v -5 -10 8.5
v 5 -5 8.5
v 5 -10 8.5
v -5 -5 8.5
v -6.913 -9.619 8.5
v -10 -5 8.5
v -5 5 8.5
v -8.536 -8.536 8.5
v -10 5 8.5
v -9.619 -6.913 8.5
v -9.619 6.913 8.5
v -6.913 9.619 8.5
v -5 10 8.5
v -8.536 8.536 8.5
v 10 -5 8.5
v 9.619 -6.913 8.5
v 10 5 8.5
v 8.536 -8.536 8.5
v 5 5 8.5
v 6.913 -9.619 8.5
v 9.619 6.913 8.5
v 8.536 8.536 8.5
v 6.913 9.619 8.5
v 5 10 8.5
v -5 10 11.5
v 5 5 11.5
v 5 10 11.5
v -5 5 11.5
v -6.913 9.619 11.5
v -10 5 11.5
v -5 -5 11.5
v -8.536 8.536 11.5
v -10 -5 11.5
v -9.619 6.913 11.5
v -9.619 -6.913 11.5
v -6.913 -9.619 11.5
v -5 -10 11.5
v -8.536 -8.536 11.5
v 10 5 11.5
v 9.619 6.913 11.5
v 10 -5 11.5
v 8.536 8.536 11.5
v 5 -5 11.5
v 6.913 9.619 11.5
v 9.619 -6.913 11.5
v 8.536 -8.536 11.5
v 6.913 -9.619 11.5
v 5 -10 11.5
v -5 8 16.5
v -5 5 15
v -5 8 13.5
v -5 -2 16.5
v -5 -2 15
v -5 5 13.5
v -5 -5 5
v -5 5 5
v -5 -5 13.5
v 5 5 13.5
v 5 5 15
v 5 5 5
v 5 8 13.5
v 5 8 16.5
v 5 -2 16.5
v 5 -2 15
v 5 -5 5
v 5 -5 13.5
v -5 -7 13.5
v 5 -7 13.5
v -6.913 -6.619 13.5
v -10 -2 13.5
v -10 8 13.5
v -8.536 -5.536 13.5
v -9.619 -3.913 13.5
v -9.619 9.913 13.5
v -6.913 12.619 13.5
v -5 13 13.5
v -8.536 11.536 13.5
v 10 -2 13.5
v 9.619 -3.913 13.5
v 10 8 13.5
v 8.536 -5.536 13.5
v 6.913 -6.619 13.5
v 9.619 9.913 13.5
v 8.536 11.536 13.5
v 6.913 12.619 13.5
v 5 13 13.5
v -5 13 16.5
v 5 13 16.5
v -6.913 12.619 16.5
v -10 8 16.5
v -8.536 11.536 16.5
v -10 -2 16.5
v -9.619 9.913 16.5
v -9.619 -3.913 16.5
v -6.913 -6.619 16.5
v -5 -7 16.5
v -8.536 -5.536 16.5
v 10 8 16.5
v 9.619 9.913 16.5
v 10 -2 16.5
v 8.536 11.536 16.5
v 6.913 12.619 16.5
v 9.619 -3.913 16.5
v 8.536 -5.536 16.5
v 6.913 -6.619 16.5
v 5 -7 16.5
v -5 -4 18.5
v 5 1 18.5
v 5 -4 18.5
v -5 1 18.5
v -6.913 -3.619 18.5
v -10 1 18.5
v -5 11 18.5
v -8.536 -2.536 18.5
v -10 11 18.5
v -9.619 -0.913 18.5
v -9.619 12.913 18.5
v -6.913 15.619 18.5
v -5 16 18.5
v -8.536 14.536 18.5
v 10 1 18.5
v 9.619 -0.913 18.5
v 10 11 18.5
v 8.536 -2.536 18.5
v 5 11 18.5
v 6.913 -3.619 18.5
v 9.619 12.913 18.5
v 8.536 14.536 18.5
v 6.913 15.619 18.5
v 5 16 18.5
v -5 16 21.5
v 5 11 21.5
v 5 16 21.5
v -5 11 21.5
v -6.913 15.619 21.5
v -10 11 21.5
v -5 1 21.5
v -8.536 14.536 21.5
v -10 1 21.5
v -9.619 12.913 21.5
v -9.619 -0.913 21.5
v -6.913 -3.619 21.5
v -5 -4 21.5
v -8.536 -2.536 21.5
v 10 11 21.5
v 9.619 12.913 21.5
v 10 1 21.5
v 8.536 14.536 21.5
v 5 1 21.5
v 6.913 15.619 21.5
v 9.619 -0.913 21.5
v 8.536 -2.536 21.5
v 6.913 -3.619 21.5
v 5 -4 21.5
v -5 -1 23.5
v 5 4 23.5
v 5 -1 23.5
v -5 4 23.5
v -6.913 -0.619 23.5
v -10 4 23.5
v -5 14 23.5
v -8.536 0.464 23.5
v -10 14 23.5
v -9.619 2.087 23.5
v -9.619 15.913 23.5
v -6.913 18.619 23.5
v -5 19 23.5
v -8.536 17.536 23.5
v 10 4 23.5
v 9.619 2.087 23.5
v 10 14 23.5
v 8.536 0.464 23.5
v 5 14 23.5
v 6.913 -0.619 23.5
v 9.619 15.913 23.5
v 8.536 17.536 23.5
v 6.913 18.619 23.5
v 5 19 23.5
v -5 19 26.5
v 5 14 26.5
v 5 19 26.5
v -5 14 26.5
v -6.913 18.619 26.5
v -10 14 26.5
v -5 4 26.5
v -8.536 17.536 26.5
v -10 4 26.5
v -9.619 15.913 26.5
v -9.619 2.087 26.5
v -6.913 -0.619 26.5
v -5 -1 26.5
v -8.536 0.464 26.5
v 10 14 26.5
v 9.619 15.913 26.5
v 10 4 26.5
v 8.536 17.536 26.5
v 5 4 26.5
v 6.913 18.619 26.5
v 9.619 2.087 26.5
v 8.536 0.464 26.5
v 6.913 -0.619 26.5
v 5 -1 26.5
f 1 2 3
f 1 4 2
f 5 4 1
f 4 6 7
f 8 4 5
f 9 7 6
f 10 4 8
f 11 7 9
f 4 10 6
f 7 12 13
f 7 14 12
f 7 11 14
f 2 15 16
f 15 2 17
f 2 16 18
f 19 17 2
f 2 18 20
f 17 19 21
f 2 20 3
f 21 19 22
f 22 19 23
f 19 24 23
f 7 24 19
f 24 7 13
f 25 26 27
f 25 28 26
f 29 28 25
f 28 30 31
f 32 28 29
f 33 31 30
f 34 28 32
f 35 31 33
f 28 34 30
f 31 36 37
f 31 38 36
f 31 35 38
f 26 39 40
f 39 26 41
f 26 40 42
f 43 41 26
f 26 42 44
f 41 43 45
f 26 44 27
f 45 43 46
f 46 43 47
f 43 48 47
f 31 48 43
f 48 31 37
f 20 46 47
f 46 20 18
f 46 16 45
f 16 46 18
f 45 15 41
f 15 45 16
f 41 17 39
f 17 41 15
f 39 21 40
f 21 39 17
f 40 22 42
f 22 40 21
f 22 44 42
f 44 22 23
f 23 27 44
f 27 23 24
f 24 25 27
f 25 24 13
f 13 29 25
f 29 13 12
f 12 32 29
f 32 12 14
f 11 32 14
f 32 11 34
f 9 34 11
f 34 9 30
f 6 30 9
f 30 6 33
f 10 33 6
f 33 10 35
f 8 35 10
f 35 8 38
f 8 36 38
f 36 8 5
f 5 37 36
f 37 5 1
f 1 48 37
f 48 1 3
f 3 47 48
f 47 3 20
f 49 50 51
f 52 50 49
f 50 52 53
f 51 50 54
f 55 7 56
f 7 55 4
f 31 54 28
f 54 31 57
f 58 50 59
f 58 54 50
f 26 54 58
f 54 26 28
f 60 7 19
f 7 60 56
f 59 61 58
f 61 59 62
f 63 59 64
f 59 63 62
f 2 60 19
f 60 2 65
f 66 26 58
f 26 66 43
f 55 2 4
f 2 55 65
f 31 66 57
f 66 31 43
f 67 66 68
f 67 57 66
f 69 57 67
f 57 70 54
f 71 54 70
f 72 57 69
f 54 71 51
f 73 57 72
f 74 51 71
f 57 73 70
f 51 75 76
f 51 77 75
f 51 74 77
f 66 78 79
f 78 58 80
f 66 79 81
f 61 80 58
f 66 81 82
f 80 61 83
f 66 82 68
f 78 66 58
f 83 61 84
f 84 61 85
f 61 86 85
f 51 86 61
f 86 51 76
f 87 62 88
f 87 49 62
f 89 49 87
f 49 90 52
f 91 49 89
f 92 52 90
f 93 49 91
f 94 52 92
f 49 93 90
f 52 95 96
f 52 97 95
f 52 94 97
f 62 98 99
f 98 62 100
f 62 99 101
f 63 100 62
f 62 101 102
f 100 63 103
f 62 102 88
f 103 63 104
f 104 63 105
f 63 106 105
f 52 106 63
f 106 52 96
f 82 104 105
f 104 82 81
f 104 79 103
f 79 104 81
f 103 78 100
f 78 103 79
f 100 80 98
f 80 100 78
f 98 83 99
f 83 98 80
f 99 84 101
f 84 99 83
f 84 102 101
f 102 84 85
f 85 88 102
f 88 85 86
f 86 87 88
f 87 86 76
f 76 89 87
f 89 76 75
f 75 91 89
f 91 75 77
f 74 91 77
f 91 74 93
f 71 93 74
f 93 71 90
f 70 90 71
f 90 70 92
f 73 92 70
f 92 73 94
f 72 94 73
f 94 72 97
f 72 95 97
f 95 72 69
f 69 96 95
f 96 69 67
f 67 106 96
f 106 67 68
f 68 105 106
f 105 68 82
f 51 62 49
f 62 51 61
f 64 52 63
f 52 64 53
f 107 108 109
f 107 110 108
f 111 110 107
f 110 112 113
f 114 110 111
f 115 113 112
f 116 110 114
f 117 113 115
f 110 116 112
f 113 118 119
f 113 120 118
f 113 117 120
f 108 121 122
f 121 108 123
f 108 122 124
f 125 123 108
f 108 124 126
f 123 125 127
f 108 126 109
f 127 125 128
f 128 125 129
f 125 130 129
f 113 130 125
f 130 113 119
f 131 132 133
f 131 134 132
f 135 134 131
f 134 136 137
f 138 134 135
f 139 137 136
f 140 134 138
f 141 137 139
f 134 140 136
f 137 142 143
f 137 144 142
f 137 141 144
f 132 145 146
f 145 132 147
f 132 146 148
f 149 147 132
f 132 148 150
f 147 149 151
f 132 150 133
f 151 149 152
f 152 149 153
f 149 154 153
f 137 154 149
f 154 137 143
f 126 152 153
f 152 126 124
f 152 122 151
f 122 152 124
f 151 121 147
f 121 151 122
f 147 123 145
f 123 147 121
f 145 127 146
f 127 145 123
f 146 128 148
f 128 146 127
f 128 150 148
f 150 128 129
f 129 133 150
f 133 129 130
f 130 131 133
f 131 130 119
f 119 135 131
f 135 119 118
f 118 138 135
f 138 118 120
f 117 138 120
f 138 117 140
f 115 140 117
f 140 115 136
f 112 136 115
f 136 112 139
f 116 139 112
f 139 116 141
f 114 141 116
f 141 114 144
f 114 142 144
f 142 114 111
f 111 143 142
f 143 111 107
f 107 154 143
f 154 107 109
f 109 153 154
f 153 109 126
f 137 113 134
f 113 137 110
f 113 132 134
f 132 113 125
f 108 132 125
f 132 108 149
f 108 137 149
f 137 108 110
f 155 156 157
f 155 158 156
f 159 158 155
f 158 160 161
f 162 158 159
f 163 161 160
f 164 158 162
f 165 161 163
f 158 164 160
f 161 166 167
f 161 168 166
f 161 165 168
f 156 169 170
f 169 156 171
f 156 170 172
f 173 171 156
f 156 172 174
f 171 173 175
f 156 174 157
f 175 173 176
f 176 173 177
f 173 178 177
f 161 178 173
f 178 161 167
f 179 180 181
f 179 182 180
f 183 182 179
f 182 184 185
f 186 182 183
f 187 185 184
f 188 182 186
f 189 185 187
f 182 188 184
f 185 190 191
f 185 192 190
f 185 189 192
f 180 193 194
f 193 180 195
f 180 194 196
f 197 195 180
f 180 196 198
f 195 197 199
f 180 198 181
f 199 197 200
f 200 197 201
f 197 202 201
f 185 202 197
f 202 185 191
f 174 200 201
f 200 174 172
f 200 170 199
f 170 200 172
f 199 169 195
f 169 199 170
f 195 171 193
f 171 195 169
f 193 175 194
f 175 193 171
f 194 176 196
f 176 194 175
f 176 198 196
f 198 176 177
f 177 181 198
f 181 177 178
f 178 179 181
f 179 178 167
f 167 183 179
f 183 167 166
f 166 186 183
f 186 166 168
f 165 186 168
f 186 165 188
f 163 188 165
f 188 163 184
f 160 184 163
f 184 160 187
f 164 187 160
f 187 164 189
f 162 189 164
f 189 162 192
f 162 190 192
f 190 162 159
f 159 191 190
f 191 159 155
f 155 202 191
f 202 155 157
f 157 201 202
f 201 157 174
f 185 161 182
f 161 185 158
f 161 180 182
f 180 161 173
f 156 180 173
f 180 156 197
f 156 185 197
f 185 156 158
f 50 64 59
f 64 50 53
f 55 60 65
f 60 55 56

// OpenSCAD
translate([0,0,10]){
    for (i=[0:3])
       translate([0,i*3,i*5]) coilShape([10,10],5,3);
    cube(10,true);
}

module coilShape(innerDims, thick, width){
    translate([0,0,-width/2]) linear_extrude(width) difference(){
      offset(thick) square(innerDims,true);
      square(innerDims,true);
    }
  }
